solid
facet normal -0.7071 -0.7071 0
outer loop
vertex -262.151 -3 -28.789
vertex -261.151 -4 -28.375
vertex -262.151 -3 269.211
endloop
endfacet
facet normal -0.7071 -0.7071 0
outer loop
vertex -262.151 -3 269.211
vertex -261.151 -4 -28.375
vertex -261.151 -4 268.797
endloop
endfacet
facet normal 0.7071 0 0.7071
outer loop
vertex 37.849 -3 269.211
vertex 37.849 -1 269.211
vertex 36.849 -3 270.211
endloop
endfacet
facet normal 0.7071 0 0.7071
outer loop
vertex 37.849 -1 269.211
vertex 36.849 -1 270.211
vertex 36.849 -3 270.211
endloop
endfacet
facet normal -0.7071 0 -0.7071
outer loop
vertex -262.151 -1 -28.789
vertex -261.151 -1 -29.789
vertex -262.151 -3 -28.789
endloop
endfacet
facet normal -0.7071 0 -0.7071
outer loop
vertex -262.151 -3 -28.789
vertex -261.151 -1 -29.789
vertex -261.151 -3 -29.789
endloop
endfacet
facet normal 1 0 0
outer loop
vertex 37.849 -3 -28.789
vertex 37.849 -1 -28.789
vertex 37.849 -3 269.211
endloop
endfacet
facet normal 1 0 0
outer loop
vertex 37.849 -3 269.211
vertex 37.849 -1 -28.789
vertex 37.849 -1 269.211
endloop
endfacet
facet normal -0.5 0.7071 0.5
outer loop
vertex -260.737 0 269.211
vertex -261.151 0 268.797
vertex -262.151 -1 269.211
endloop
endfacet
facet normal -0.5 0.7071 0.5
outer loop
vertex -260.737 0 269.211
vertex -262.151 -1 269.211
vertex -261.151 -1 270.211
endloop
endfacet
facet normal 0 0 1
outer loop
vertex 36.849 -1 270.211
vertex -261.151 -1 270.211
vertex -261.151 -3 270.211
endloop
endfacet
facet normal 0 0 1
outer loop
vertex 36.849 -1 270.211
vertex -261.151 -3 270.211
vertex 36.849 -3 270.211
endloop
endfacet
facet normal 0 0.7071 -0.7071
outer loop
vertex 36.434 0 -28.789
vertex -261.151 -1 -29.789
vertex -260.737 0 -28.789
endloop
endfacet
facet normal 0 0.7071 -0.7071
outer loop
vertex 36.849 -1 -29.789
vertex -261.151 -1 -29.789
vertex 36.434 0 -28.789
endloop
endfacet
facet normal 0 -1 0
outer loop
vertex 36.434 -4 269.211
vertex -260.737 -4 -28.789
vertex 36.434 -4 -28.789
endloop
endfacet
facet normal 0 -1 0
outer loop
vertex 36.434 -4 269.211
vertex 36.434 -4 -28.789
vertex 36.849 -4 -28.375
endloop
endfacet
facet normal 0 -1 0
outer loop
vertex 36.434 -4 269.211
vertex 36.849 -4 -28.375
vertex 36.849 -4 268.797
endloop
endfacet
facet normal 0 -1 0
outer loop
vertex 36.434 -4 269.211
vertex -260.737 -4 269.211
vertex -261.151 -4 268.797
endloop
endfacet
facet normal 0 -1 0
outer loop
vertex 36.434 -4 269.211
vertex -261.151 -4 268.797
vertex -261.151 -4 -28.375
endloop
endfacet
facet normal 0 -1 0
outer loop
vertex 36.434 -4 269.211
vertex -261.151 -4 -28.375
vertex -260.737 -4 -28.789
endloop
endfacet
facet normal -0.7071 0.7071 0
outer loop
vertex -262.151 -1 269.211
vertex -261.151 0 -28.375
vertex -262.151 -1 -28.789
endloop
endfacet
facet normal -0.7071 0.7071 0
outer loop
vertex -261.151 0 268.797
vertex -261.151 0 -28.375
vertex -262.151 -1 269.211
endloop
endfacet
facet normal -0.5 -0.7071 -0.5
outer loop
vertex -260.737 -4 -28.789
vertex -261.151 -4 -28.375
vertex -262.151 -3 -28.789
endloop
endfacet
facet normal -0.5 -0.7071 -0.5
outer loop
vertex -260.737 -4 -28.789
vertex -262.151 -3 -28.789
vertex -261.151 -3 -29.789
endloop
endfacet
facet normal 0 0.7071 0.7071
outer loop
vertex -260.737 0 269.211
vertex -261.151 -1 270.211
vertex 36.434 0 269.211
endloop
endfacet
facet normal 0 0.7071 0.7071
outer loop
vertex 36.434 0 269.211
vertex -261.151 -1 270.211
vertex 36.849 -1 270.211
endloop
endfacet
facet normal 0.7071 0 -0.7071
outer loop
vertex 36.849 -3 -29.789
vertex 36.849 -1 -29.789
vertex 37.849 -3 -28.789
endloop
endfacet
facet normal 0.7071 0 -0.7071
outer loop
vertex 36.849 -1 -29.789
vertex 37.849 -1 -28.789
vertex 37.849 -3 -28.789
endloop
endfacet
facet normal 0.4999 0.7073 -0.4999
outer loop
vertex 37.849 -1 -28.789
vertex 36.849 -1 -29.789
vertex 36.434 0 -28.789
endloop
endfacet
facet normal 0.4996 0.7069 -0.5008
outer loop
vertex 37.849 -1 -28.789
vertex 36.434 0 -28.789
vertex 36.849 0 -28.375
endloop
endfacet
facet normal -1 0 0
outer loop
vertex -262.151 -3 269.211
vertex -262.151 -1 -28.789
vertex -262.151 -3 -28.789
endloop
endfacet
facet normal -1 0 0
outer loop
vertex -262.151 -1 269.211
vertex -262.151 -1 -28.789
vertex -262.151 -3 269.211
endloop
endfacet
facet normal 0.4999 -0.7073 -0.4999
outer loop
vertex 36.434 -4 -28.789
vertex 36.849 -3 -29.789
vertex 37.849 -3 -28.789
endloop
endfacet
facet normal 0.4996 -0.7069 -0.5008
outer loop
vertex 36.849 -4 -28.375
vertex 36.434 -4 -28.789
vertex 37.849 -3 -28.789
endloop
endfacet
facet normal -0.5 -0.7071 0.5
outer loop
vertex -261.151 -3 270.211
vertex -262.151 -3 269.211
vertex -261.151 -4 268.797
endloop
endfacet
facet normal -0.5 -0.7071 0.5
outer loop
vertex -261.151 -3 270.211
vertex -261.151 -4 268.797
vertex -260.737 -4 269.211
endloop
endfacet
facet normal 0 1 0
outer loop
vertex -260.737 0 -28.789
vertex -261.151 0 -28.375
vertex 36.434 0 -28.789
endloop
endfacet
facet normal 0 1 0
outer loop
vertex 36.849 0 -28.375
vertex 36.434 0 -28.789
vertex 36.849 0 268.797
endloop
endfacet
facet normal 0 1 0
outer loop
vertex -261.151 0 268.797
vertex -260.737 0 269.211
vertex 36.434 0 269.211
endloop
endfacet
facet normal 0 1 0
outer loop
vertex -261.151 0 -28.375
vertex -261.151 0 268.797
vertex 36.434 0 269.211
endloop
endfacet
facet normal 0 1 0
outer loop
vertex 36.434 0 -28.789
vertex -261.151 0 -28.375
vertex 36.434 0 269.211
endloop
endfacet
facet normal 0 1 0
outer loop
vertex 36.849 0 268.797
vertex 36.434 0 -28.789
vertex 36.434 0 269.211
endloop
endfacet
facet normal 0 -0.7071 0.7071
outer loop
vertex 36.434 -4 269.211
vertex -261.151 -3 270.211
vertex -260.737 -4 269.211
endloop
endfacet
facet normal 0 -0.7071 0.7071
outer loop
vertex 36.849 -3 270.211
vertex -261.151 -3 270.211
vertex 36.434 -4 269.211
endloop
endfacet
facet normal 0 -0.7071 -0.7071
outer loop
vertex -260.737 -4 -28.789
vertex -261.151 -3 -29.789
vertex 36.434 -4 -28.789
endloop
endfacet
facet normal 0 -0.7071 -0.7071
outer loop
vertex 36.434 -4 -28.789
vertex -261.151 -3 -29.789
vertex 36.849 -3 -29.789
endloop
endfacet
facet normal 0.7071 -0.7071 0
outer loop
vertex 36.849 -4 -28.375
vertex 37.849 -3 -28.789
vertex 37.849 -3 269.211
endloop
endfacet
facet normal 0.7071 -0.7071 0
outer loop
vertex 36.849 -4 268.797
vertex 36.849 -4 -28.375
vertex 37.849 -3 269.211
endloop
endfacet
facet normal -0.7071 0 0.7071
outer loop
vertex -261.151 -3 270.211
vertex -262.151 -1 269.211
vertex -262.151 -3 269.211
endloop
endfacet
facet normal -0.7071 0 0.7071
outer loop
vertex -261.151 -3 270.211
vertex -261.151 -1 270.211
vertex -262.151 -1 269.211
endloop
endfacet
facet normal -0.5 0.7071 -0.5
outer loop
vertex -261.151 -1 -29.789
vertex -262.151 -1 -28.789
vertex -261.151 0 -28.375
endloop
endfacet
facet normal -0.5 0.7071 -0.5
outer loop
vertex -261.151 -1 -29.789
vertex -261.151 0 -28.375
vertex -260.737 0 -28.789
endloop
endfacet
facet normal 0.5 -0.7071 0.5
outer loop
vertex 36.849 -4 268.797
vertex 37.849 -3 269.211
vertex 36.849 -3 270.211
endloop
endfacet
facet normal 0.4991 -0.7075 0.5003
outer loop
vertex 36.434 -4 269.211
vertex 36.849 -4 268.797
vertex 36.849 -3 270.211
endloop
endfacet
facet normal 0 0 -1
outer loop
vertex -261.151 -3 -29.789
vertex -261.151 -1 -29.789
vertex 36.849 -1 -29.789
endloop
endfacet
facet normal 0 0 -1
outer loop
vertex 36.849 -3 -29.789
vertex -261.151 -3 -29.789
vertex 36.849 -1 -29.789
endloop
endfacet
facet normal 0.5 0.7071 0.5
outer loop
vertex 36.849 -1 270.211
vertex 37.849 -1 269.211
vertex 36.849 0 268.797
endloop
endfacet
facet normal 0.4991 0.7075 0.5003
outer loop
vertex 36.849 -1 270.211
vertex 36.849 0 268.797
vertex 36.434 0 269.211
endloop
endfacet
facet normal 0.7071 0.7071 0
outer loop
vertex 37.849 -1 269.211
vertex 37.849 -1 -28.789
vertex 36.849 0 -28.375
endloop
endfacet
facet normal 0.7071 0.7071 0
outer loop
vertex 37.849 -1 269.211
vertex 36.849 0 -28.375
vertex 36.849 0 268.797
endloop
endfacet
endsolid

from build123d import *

# Parameters (mm, degrees)
F0_W     = 300
F0_H     = 300
F1_DEPTH = 4
F2_SIZE  = 1
F3_SIZE  = 1


with BuildPart() as f1:
    # F0 (on Front) → F1 (new body)
    with BuildSketch(Plane.XZ):
        with Locations((-112.1514305472, 120.2112711966)):
            Rectangle(F0_W, F0_H)
    extrude(amount=F1_DEPTH)

    # F2
    f2_edges = [f1.edges().sort_by_distance(p)[0] for p in [
        (-262.151431, -2, 270.211271),
        (37.848569, -2, 270.211271),
        (37.848569, -2, -29.788729),
        (-262.151431, -2, -29.788729),
    ]]
    chamfer(f2_edges, length=F2_SIZE)

    # F3
    f3_edges = [f1.edges().sort_by_distance(p)[0] for p in [
        (-112.151431, -4, -29.788729),
        (-261.651431, -4, -29.288729),
        (-262.151431, -4, 120.211271),
        (37.348569, -4, -29.288729),
        (37.848569, -4, 120.211271),
        (37.848569, 0, 120.211271),
        (37.348569, 0, -29.288729),
        (-112.151431, 0, -29.788729),
        (-261.651431, 0, -29.288729),
        (-262.151431, 0, 120.211271),
        (-261.651431, -4, 269.711271),
        (-261.651431, 0, 269.711271),
        (-112.151431, 0, 270.211271),
        (-112.151431, -4, 270.211271),
        (37.348569, -4, 269.711271),
        (37.348569, 0, 269.711271),
    ]]
    chamfer(f3_edges, length=F3_SIZE)


solid = f1.part
